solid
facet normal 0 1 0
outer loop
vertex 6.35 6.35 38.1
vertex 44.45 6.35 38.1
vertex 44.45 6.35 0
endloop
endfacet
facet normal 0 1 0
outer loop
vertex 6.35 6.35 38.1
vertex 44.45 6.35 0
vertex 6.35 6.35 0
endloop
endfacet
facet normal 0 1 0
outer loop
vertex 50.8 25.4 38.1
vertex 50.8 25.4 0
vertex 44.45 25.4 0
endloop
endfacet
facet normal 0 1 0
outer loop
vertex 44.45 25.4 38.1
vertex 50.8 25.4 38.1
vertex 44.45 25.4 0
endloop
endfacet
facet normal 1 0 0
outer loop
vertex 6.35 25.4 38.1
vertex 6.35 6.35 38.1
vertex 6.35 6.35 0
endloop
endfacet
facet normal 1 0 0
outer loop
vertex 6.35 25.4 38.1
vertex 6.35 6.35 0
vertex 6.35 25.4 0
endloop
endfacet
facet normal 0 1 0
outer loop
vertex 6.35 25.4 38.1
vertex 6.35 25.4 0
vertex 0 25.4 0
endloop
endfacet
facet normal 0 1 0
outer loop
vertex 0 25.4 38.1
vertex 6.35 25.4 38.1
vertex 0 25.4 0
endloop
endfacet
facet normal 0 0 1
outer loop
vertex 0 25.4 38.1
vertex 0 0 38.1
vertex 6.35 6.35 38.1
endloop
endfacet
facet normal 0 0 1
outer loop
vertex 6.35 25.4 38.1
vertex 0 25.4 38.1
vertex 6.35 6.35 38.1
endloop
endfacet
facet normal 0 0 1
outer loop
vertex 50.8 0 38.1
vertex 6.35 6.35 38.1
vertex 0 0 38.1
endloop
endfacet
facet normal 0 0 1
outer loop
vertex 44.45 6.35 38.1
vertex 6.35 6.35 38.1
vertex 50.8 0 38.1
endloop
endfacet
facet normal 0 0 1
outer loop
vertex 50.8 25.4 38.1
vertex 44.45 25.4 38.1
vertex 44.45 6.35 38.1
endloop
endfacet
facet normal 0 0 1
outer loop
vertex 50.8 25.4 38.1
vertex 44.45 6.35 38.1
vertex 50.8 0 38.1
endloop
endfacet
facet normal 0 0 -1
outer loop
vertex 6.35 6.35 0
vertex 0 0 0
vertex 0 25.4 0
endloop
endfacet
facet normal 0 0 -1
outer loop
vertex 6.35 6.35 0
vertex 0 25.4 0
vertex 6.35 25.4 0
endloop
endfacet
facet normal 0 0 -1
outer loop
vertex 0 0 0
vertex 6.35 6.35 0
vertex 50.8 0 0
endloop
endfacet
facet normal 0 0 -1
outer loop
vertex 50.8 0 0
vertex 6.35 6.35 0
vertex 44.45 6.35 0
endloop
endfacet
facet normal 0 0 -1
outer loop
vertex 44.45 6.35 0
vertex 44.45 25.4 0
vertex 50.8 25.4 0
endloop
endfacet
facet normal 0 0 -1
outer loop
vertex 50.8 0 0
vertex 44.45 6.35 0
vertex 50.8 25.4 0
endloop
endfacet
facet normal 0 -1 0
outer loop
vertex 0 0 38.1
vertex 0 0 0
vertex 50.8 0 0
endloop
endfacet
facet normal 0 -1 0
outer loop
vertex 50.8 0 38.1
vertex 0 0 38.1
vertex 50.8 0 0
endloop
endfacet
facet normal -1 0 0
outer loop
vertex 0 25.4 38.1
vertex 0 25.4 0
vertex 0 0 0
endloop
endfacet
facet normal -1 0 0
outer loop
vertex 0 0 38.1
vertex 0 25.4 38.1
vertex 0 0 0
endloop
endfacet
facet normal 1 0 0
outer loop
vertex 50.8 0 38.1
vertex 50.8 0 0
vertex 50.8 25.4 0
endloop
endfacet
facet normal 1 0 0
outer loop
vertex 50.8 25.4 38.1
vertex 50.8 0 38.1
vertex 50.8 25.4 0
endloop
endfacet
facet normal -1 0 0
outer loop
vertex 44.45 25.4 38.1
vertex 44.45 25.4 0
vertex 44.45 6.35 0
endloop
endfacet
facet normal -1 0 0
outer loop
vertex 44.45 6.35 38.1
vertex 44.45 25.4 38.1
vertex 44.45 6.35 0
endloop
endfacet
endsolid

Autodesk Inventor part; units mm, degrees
ref_plane "YZ Plane" through (0, 0, 0) normal (1, 0, 0) x (0, 1, 0)
ref_plane "XZ Plane" through (0, 0, 0) normal (0, 1, 0) x (-1, 0, 0)
ref_plane "XY Plane" through (0, 0, 0) normal (0, 0, 1) x (1, 0, 0)
sketch "Sketch1" plane through (0, 0, 0) normal (0, 0, 1) x (1, 0, 0)
  line L0 (0, 0) -> (50.8, 0)
  line L1 (50.8, 0) -> (50.8, 25.4)
  line L2 (50.8, 25.4) -> (0, 25.4)
  line L3 (0, 25.4) -> (0, 0)
  dimension "d0" = 50.8
  dimension "d1" = 25.4
extrude "Extrusion1" add sketch "Sketch1" along normal blind 38.1
sketch "Sketch2" plane through (0, 0, 38.1) normal (0, 0, 1) x (1, 0, 0)
  line L0 (0, 0) -> (50.8, 0) projected
  line L1 (50.8, 0) -> (50.8, 25.4) projected
  line L2 (50.8, 25.4) -> (0, 25.4) projected
  line L3 (0, 25.4) -> (0, 0) projected
  line L4 (6.35, 25.4) -> (44.45, 25.4)
  line L5 (44.45, 25.4) -> (44.45, 6.35)
  line L6 (44.45, 6.35) -> (6.35, 6.35)
  line L7 (6.35, 6.35) -> (6.35, 25.4)
  dimension "d4" = 6.35
  dimension "d5" = 6.35
  dimension "d6" = 6.35
extrude "Extrusion2" cut sketch "Sketch2" against normal through all contours L2 L5 L6 L7
equation "\"d5\" = d4"
equation "\"d6\" = d4"
properties part number "To Next Termination"
